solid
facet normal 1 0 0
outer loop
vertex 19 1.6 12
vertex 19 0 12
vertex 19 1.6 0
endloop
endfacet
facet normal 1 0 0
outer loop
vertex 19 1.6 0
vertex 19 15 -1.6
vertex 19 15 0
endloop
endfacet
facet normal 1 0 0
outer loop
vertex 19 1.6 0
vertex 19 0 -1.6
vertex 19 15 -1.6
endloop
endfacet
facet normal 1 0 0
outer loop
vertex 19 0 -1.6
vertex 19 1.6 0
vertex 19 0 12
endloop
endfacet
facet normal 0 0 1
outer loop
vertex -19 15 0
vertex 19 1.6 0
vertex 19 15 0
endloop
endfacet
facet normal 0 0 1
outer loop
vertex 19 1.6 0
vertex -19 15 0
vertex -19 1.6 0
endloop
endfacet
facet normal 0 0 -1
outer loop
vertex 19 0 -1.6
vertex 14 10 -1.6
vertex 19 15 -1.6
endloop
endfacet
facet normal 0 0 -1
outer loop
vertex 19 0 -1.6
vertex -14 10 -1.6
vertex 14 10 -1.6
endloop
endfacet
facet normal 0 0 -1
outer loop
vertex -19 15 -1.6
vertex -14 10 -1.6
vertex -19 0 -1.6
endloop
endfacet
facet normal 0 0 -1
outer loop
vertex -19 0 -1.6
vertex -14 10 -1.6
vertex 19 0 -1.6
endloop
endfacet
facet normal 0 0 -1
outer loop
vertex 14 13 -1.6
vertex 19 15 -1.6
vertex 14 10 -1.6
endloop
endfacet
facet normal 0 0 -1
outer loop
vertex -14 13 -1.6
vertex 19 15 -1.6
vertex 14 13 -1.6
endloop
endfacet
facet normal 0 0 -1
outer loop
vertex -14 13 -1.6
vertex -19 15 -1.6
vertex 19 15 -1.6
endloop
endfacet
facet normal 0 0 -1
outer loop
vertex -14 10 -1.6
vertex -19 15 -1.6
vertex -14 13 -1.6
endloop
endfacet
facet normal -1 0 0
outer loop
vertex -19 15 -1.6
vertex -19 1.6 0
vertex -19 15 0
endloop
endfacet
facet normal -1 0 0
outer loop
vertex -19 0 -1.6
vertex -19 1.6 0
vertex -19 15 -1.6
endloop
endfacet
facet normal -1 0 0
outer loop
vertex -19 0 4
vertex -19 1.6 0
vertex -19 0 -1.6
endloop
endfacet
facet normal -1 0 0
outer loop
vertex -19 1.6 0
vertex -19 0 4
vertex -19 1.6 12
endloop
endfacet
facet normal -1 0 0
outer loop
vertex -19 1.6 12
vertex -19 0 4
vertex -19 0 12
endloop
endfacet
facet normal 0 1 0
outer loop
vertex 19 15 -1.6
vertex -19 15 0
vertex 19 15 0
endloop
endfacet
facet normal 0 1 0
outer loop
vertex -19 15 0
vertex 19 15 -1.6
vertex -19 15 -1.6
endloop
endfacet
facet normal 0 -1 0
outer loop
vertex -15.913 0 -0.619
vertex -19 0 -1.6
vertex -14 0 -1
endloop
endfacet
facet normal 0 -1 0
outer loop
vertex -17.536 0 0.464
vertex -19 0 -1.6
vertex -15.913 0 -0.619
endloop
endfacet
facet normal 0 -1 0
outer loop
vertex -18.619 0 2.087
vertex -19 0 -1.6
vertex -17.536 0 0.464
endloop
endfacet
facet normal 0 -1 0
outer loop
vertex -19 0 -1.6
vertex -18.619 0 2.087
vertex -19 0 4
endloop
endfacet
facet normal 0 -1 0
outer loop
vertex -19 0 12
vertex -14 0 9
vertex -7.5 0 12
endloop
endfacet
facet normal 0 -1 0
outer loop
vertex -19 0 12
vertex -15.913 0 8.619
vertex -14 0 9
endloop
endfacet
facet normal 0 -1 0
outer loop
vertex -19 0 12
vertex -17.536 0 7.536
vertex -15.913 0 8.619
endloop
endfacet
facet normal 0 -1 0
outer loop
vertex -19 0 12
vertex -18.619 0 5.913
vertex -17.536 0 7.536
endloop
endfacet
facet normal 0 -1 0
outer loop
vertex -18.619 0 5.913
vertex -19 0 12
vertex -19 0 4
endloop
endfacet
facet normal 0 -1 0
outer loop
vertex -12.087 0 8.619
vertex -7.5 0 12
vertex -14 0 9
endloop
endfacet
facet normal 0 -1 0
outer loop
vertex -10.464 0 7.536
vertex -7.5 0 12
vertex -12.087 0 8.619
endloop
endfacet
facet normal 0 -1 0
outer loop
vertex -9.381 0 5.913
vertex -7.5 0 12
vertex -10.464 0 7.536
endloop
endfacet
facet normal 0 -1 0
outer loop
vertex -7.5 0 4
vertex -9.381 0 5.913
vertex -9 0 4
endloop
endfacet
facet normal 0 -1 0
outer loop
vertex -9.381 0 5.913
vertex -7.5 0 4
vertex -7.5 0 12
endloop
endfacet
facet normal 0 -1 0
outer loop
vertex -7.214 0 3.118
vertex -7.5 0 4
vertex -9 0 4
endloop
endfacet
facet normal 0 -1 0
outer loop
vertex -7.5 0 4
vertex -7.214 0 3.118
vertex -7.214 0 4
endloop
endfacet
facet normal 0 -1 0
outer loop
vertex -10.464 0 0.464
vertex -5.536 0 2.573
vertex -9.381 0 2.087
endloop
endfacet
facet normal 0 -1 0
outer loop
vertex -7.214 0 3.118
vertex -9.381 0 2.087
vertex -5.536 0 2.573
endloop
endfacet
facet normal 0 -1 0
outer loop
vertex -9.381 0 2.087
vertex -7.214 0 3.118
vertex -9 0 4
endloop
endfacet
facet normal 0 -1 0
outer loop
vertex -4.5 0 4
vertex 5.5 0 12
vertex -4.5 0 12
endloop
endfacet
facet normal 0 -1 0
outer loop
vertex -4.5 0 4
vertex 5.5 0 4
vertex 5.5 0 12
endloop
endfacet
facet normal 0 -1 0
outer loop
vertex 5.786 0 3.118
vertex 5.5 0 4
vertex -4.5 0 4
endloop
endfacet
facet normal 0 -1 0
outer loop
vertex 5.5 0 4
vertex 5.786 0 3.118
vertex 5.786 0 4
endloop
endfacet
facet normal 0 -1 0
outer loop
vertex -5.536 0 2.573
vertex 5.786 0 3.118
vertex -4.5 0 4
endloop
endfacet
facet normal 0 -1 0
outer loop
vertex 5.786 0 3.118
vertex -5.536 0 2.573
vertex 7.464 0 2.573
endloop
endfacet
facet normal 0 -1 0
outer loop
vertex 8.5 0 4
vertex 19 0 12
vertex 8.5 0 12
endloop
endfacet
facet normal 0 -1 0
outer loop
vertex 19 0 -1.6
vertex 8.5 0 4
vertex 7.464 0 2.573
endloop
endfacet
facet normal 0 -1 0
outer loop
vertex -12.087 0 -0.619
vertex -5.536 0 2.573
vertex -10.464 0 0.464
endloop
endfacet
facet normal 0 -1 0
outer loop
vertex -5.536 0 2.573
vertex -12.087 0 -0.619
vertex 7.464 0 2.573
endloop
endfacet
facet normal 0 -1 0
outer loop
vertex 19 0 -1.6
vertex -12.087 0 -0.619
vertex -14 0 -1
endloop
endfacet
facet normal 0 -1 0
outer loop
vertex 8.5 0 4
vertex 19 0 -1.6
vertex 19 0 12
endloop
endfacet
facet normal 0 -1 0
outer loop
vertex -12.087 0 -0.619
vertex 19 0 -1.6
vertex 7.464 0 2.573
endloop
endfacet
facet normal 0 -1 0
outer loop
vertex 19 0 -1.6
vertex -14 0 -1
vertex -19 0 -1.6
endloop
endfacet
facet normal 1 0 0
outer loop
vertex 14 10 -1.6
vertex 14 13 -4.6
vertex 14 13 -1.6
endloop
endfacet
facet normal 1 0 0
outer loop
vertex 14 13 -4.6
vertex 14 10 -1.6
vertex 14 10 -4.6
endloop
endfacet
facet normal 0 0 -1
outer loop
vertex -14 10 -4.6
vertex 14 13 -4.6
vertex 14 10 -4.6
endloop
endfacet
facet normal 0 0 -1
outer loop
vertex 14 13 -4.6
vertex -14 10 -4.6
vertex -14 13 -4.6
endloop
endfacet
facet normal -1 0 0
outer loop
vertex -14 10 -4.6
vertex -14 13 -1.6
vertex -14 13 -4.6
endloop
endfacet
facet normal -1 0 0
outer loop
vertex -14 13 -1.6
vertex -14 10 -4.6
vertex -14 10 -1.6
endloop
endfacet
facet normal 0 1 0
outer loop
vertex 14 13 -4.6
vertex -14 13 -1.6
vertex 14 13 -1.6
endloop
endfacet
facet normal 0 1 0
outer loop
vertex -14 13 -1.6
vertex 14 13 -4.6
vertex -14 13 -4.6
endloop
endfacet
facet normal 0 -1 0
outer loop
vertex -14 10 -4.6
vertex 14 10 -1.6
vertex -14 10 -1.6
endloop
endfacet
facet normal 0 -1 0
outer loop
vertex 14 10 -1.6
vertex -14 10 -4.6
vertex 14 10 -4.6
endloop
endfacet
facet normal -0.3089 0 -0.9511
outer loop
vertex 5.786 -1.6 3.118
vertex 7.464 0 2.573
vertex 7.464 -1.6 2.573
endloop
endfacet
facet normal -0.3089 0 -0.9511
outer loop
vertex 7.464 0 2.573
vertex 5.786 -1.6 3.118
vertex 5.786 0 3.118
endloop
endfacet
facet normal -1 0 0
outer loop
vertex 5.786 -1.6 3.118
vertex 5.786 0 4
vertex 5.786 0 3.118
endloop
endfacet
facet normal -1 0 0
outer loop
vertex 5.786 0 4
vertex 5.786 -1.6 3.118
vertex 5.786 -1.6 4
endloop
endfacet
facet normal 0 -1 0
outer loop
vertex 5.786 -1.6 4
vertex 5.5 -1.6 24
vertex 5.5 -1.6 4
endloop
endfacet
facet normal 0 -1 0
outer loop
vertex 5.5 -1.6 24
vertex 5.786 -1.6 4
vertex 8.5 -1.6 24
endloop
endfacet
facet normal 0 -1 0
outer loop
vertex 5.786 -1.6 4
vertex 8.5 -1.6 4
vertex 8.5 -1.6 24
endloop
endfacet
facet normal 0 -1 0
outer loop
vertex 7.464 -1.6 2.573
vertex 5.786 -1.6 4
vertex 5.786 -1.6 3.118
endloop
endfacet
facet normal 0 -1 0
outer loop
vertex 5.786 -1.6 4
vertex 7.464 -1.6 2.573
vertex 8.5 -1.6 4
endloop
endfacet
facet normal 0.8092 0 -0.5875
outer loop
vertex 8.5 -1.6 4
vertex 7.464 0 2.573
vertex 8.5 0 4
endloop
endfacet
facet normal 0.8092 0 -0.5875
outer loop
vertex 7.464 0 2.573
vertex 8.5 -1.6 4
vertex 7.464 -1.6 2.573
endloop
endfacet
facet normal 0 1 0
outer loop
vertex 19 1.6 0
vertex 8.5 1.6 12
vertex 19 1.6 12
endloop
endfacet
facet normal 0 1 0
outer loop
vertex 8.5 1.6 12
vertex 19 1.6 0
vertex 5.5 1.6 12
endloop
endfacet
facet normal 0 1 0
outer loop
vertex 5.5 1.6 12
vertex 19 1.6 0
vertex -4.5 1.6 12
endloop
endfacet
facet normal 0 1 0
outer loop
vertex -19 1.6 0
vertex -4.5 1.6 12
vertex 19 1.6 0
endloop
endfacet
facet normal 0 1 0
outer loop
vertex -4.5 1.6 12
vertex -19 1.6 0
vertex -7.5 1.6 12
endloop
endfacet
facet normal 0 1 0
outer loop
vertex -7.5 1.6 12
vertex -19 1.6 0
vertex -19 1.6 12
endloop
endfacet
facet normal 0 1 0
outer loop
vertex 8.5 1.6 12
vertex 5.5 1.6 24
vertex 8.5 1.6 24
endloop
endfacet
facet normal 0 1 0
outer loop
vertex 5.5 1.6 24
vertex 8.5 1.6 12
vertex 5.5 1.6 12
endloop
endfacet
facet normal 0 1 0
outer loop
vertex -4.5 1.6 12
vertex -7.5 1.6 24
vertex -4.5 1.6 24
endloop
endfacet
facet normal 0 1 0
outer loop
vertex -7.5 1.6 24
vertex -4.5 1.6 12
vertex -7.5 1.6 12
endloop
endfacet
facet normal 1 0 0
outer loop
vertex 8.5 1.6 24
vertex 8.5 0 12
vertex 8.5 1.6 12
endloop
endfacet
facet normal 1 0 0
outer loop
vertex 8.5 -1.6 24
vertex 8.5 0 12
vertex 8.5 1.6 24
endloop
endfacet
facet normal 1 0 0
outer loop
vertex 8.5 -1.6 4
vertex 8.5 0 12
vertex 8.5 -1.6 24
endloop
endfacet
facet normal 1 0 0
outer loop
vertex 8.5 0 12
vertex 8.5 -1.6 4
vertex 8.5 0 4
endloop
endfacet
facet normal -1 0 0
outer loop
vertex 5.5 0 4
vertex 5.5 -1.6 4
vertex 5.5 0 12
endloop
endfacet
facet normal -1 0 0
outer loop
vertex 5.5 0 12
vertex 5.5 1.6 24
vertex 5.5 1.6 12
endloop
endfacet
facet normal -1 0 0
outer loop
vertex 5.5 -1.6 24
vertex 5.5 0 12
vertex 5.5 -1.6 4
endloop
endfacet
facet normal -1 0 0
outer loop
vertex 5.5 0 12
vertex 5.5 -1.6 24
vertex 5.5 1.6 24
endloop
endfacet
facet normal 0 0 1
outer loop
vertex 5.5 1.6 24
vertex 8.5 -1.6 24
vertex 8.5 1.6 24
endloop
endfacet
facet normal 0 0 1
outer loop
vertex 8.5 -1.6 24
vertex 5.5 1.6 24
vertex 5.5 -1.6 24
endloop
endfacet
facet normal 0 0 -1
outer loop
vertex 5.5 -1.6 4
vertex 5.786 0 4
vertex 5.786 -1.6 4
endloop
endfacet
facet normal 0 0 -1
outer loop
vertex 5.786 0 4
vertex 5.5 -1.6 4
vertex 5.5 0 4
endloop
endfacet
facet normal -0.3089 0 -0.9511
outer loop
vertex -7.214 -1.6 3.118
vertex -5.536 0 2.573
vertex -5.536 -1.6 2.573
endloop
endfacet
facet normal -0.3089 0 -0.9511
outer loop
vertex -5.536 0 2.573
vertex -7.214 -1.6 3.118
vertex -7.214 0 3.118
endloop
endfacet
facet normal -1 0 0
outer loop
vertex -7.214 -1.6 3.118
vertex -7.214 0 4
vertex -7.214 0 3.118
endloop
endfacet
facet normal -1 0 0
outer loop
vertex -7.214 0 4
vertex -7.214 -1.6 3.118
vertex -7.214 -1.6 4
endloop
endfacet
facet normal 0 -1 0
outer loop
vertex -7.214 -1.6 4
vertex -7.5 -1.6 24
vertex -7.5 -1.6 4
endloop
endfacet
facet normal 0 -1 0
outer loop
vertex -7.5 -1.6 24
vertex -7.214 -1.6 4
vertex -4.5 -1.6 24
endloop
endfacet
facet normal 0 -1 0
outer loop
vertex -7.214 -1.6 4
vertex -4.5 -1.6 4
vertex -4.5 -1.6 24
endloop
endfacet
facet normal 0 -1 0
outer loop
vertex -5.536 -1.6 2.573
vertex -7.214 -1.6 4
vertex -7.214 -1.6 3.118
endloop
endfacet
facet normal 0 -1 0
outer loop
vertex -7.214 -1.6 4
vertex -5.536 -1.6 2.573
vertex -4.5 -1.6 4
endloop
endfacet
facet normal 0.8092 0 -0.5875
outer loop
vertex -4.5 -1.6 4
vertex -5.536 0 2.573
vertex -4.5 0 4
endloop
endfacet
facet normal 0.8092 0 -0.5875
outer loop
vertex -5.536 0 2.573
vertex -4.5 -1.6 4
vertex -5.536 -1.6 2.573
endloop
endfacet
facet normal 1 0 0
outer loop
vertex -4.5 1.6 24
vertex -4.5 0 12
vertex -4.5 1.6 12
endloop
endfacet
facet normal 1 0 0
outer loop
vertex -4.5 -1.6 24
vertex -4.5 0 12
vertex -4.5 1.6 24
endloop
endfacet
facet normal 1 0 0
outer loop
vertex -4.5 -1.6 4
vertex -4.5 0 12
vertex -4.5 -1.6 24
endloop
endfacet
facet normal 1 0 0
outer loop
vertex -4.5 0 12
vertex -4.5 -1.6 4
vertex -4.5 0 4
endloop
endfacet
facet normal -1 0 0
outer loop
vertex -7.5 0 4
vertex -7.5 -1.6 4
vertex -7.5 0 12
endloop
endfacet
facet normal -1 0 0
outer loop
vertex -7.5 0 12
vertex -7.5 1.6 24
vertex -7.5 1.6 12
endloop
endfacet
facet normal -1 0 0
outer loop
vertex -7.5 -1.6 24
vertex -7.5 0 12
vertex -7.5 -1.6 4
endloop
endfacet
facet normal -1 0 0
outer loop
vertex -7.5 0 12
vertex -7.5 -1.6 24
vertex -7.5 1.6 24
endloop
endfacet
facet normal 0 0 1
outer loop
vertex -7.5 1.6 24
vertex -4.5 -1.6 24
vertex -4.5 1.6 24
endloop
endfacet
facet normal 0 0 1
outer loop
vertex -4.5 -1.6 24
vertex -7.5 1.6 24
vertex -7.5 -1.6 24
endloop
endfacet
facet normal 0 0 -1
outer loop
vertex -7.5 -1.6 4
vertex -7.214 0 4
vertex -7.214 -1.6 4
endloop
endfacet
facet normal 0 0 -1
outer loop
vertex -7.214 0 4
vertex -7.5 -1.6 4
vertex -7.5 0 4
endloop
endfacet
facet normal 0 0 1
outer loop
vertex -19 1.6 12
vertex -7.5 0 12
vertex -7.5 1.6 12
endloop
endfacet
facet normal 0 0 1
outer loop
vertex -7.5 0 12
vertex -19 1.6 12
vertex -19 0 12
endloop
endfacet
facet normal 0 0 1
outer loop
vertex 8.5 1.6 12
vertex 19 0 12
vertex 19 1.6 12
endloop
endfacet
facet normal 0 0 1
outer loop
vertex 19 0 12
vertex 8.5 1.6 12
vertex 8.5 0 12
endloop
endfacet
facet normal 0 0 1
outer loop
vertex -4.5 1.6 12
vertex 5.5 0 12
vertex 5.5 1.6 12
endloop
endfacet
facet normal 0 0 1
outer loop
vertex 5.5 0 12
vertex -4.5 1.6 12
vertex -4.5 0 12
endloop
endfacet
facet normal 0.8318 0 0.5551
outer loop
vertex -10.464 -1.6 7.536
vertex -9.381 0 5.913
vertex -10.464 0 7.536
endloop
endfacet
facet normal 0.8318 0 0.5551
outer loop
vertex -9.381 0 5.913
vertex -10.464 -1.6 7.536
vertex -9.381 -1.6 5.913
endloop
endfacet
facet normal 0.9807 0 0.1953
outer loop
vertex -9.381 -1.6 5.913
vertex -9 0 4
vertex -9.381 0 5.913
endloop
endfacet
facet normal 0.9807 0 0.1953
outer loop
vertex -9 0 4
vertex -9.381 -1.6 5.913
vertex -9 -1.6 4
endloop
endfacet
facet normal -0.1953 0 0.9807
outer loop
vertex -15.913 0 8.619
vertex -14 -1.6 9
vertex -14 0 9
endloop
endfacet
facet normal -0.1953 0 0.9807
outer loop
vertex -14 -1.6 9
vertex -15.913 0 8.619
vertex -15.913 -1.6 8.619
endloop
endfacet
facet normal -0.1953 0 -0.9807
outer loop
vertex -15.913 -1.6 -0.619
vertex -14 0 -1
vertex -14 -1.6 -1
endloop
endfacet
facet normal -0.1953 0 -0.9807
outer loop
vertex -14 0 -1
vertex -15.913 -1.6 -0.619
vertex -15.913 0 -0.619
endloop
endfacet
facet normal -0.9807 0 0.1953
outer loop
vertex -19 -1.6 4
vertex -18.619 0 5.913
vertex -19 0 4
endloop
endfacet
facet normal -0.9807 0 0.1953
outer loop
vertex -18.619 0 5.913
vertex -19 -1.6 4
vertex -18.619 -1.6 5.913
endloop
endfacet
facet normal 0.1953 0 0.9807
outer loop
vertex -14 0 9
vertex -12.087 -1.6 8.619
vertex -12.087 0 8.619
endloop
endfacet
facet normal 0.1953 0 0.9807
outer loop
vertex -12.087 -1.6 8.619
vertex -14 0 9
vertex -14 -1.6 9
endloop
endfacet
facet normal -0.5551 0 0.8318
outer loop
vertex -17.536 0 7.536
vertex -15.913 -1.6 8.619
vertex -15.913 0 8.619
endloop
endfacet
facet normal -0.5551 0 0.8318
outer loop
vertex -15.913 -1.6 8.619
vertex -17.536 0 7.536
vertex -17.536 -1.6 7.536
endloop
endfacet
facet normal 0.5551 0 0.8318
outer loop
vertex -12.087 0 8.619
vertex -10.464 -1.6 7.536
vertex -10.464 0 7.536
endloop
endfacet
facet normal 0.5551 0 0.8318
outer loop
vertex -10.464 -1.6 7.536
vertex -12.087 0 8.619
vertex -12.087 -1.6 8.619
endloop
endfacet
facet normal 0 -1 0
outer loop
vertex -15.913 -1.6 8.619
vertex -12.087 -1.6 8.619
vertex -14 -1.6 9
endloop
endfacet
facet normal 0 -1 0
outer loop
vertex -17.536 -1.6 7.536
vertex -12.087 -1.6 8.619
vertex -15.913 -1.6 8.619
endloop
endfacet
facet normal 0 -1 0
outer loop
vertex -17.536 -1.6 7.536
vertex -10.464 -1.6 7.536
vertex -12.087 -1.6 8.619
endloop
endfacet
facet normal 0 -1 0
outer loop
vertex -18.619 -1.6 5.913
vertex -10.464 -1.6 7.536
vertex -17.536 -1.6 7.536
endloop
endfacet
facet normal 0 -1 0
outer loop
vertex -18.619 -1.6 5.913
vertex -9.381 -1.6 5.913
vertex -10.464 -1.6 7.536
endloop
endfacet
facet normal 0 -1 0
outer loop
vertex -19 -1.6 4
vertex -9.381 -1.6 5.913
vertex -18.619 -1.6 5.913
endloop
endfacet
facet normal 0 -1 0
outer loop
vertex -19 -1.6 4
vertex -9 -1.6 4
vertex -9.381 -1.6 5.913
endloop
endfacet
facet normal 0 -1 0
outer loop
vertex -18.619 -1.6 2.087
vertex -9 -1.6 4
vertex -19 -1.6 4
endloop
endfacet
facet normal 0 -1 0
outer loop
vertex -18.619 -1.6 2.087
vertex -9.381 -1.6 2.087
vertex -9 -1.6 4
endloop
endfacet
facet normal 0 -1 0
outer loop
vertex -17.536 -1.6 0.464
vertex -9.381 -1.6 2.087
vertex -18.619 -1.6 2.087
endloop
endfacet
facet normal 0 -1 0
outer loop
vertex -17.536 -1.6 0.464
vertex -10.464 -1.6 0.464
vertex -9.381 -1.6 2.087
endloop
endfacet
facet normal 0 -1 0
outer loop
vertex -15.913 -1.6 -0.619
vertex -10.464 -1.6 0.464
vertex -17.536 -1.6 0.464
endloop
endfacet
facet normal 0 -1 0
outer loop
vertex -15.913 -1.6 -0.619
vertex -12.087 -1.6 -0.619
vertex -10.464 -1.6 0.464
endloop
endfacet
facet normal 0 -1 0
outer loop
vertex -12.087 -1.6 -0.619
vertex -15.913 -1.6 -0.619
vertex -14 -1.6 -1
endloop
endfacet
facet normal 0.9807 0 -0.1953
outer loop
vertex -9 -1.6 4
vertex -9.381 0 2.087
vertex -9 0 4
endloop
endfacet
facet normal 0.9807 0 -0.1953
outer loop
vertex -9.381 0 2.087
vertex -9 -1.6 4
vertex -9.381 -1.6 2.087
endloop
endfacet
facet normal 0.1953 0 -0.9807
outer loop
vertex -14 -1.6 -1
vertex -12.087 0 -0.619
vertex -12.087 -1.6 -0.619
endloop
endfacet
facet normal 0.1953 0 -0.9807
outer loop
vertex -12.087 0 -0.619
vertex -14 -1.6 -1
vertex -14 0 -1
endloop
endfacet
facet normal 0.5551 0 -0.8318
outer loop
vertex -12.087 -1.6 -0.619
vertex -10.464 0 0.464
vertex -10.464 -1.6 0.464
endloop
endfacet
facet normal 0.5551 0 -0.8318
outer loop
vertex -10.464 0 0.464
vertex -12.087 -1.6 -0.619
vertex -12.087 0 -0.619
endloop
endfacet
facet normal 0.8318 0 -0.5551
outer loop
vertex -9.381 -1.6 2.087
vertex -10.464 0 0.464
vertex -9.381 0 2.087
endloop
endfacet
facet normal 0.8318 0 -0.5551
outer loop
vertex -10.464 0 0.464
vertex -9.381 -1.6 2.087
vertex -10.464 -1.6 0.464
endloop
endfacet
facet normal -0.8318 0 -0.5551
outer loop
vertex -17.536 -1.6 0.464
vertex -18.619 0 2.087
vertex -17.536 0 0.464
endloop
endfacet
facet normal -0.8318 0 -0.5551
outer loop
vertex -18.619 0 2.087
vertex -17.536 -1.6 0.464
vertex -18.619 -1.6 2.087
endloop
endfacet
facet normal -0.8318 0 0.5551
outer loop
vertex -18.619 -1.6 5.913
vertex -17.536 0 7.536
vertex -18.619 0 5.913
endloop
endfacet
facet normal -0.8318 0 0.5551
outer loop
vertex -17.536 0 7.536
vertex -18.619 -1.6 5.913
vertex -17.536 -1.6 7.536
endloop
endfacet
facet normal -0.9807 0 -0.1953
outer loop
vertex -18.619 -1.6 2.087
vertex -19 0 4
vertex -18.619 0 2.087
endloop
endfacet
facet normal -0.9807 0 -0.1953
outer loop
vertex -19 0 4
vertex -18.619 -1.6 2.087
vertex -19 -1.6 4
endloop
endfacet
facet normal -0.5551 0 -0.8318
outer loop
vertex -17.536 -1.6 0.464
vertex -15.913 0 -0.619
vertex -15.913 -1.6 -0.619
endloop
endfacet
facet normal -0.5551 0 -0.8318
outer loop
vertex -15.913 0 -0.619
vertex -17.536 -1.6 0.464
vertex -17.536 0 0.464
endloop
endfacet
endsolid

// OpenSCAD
/* Permet de contruire un support pour les bouttons du boitier NES
By jeff le 10/2017
*/

//Declaration des variables

/* [Basic] */
//Depth buttons (in mm)
_depth_right_button = 20; //[1:30]
_diameter_button = 3; //[1:20]

/* [Right_button] */
//Diameter Right button (in mm)
_diameter_right_button = 10; //[1:20]



/* [Left_button] */
//Diameter Left button (in mm)
_diameter_left_button = 10; //[1:20]


/* [LED] */
//Diameter LED (in mm)
_diameter_led = 10; //[1:20]


/* [hidden] */
_epaisseur = 1.6;
_largeur = 38;
_hauteur_base_axe = 4;


//!Déclaration des variables

//Contruction de la base

base();

reglage(0);

*trou_bouton(10);

//Base horizontale
module base(){
	translate([-_largeur/2,0,-_epaisseur]){
		cube(size = [_largeur,15,_epaisseur], center = false);
	}	
	//Patte d'arret
	translate([-28/2,10,-3-_epaisseur]){
		cube(size = [28,3,3], center = false);
	}
}//!module base


module reglage(_profondeur){
//Patte verticale
translate([-_largeur/2,_profondeur,0]){
	cube(size = [_largeur,_epaisseur,12], center = false);
}




//Trous a droite
translate([7,0,_hauteur_base_axe]){
	trou_bouton(_diameter_button);
}

//Trous a gauche
translate([-6,0,_hauteur_base_axe]){
	trou_bouton(_diameter_button);
}

//Trous LED
translate([-14,0,_hauteur_base_axe]){
	rotate([90,0,0]){
		cylinder(h=_epaisseur*2,r=(_diameter_led/2),center=true);
	}
}




}//!Module reglage


module trou_bouton(_diametre){

	rotate([90,0,0]){
		cylinder(h=_epaisseur*2,r=(_diametre/2),center=true);
		
		translate([0,20/2,0]){
			cube(size = [_diametre,20,_epaisseur*2], center = true);
		}
		
	}//!rotate

}//!trou_bouton
	
